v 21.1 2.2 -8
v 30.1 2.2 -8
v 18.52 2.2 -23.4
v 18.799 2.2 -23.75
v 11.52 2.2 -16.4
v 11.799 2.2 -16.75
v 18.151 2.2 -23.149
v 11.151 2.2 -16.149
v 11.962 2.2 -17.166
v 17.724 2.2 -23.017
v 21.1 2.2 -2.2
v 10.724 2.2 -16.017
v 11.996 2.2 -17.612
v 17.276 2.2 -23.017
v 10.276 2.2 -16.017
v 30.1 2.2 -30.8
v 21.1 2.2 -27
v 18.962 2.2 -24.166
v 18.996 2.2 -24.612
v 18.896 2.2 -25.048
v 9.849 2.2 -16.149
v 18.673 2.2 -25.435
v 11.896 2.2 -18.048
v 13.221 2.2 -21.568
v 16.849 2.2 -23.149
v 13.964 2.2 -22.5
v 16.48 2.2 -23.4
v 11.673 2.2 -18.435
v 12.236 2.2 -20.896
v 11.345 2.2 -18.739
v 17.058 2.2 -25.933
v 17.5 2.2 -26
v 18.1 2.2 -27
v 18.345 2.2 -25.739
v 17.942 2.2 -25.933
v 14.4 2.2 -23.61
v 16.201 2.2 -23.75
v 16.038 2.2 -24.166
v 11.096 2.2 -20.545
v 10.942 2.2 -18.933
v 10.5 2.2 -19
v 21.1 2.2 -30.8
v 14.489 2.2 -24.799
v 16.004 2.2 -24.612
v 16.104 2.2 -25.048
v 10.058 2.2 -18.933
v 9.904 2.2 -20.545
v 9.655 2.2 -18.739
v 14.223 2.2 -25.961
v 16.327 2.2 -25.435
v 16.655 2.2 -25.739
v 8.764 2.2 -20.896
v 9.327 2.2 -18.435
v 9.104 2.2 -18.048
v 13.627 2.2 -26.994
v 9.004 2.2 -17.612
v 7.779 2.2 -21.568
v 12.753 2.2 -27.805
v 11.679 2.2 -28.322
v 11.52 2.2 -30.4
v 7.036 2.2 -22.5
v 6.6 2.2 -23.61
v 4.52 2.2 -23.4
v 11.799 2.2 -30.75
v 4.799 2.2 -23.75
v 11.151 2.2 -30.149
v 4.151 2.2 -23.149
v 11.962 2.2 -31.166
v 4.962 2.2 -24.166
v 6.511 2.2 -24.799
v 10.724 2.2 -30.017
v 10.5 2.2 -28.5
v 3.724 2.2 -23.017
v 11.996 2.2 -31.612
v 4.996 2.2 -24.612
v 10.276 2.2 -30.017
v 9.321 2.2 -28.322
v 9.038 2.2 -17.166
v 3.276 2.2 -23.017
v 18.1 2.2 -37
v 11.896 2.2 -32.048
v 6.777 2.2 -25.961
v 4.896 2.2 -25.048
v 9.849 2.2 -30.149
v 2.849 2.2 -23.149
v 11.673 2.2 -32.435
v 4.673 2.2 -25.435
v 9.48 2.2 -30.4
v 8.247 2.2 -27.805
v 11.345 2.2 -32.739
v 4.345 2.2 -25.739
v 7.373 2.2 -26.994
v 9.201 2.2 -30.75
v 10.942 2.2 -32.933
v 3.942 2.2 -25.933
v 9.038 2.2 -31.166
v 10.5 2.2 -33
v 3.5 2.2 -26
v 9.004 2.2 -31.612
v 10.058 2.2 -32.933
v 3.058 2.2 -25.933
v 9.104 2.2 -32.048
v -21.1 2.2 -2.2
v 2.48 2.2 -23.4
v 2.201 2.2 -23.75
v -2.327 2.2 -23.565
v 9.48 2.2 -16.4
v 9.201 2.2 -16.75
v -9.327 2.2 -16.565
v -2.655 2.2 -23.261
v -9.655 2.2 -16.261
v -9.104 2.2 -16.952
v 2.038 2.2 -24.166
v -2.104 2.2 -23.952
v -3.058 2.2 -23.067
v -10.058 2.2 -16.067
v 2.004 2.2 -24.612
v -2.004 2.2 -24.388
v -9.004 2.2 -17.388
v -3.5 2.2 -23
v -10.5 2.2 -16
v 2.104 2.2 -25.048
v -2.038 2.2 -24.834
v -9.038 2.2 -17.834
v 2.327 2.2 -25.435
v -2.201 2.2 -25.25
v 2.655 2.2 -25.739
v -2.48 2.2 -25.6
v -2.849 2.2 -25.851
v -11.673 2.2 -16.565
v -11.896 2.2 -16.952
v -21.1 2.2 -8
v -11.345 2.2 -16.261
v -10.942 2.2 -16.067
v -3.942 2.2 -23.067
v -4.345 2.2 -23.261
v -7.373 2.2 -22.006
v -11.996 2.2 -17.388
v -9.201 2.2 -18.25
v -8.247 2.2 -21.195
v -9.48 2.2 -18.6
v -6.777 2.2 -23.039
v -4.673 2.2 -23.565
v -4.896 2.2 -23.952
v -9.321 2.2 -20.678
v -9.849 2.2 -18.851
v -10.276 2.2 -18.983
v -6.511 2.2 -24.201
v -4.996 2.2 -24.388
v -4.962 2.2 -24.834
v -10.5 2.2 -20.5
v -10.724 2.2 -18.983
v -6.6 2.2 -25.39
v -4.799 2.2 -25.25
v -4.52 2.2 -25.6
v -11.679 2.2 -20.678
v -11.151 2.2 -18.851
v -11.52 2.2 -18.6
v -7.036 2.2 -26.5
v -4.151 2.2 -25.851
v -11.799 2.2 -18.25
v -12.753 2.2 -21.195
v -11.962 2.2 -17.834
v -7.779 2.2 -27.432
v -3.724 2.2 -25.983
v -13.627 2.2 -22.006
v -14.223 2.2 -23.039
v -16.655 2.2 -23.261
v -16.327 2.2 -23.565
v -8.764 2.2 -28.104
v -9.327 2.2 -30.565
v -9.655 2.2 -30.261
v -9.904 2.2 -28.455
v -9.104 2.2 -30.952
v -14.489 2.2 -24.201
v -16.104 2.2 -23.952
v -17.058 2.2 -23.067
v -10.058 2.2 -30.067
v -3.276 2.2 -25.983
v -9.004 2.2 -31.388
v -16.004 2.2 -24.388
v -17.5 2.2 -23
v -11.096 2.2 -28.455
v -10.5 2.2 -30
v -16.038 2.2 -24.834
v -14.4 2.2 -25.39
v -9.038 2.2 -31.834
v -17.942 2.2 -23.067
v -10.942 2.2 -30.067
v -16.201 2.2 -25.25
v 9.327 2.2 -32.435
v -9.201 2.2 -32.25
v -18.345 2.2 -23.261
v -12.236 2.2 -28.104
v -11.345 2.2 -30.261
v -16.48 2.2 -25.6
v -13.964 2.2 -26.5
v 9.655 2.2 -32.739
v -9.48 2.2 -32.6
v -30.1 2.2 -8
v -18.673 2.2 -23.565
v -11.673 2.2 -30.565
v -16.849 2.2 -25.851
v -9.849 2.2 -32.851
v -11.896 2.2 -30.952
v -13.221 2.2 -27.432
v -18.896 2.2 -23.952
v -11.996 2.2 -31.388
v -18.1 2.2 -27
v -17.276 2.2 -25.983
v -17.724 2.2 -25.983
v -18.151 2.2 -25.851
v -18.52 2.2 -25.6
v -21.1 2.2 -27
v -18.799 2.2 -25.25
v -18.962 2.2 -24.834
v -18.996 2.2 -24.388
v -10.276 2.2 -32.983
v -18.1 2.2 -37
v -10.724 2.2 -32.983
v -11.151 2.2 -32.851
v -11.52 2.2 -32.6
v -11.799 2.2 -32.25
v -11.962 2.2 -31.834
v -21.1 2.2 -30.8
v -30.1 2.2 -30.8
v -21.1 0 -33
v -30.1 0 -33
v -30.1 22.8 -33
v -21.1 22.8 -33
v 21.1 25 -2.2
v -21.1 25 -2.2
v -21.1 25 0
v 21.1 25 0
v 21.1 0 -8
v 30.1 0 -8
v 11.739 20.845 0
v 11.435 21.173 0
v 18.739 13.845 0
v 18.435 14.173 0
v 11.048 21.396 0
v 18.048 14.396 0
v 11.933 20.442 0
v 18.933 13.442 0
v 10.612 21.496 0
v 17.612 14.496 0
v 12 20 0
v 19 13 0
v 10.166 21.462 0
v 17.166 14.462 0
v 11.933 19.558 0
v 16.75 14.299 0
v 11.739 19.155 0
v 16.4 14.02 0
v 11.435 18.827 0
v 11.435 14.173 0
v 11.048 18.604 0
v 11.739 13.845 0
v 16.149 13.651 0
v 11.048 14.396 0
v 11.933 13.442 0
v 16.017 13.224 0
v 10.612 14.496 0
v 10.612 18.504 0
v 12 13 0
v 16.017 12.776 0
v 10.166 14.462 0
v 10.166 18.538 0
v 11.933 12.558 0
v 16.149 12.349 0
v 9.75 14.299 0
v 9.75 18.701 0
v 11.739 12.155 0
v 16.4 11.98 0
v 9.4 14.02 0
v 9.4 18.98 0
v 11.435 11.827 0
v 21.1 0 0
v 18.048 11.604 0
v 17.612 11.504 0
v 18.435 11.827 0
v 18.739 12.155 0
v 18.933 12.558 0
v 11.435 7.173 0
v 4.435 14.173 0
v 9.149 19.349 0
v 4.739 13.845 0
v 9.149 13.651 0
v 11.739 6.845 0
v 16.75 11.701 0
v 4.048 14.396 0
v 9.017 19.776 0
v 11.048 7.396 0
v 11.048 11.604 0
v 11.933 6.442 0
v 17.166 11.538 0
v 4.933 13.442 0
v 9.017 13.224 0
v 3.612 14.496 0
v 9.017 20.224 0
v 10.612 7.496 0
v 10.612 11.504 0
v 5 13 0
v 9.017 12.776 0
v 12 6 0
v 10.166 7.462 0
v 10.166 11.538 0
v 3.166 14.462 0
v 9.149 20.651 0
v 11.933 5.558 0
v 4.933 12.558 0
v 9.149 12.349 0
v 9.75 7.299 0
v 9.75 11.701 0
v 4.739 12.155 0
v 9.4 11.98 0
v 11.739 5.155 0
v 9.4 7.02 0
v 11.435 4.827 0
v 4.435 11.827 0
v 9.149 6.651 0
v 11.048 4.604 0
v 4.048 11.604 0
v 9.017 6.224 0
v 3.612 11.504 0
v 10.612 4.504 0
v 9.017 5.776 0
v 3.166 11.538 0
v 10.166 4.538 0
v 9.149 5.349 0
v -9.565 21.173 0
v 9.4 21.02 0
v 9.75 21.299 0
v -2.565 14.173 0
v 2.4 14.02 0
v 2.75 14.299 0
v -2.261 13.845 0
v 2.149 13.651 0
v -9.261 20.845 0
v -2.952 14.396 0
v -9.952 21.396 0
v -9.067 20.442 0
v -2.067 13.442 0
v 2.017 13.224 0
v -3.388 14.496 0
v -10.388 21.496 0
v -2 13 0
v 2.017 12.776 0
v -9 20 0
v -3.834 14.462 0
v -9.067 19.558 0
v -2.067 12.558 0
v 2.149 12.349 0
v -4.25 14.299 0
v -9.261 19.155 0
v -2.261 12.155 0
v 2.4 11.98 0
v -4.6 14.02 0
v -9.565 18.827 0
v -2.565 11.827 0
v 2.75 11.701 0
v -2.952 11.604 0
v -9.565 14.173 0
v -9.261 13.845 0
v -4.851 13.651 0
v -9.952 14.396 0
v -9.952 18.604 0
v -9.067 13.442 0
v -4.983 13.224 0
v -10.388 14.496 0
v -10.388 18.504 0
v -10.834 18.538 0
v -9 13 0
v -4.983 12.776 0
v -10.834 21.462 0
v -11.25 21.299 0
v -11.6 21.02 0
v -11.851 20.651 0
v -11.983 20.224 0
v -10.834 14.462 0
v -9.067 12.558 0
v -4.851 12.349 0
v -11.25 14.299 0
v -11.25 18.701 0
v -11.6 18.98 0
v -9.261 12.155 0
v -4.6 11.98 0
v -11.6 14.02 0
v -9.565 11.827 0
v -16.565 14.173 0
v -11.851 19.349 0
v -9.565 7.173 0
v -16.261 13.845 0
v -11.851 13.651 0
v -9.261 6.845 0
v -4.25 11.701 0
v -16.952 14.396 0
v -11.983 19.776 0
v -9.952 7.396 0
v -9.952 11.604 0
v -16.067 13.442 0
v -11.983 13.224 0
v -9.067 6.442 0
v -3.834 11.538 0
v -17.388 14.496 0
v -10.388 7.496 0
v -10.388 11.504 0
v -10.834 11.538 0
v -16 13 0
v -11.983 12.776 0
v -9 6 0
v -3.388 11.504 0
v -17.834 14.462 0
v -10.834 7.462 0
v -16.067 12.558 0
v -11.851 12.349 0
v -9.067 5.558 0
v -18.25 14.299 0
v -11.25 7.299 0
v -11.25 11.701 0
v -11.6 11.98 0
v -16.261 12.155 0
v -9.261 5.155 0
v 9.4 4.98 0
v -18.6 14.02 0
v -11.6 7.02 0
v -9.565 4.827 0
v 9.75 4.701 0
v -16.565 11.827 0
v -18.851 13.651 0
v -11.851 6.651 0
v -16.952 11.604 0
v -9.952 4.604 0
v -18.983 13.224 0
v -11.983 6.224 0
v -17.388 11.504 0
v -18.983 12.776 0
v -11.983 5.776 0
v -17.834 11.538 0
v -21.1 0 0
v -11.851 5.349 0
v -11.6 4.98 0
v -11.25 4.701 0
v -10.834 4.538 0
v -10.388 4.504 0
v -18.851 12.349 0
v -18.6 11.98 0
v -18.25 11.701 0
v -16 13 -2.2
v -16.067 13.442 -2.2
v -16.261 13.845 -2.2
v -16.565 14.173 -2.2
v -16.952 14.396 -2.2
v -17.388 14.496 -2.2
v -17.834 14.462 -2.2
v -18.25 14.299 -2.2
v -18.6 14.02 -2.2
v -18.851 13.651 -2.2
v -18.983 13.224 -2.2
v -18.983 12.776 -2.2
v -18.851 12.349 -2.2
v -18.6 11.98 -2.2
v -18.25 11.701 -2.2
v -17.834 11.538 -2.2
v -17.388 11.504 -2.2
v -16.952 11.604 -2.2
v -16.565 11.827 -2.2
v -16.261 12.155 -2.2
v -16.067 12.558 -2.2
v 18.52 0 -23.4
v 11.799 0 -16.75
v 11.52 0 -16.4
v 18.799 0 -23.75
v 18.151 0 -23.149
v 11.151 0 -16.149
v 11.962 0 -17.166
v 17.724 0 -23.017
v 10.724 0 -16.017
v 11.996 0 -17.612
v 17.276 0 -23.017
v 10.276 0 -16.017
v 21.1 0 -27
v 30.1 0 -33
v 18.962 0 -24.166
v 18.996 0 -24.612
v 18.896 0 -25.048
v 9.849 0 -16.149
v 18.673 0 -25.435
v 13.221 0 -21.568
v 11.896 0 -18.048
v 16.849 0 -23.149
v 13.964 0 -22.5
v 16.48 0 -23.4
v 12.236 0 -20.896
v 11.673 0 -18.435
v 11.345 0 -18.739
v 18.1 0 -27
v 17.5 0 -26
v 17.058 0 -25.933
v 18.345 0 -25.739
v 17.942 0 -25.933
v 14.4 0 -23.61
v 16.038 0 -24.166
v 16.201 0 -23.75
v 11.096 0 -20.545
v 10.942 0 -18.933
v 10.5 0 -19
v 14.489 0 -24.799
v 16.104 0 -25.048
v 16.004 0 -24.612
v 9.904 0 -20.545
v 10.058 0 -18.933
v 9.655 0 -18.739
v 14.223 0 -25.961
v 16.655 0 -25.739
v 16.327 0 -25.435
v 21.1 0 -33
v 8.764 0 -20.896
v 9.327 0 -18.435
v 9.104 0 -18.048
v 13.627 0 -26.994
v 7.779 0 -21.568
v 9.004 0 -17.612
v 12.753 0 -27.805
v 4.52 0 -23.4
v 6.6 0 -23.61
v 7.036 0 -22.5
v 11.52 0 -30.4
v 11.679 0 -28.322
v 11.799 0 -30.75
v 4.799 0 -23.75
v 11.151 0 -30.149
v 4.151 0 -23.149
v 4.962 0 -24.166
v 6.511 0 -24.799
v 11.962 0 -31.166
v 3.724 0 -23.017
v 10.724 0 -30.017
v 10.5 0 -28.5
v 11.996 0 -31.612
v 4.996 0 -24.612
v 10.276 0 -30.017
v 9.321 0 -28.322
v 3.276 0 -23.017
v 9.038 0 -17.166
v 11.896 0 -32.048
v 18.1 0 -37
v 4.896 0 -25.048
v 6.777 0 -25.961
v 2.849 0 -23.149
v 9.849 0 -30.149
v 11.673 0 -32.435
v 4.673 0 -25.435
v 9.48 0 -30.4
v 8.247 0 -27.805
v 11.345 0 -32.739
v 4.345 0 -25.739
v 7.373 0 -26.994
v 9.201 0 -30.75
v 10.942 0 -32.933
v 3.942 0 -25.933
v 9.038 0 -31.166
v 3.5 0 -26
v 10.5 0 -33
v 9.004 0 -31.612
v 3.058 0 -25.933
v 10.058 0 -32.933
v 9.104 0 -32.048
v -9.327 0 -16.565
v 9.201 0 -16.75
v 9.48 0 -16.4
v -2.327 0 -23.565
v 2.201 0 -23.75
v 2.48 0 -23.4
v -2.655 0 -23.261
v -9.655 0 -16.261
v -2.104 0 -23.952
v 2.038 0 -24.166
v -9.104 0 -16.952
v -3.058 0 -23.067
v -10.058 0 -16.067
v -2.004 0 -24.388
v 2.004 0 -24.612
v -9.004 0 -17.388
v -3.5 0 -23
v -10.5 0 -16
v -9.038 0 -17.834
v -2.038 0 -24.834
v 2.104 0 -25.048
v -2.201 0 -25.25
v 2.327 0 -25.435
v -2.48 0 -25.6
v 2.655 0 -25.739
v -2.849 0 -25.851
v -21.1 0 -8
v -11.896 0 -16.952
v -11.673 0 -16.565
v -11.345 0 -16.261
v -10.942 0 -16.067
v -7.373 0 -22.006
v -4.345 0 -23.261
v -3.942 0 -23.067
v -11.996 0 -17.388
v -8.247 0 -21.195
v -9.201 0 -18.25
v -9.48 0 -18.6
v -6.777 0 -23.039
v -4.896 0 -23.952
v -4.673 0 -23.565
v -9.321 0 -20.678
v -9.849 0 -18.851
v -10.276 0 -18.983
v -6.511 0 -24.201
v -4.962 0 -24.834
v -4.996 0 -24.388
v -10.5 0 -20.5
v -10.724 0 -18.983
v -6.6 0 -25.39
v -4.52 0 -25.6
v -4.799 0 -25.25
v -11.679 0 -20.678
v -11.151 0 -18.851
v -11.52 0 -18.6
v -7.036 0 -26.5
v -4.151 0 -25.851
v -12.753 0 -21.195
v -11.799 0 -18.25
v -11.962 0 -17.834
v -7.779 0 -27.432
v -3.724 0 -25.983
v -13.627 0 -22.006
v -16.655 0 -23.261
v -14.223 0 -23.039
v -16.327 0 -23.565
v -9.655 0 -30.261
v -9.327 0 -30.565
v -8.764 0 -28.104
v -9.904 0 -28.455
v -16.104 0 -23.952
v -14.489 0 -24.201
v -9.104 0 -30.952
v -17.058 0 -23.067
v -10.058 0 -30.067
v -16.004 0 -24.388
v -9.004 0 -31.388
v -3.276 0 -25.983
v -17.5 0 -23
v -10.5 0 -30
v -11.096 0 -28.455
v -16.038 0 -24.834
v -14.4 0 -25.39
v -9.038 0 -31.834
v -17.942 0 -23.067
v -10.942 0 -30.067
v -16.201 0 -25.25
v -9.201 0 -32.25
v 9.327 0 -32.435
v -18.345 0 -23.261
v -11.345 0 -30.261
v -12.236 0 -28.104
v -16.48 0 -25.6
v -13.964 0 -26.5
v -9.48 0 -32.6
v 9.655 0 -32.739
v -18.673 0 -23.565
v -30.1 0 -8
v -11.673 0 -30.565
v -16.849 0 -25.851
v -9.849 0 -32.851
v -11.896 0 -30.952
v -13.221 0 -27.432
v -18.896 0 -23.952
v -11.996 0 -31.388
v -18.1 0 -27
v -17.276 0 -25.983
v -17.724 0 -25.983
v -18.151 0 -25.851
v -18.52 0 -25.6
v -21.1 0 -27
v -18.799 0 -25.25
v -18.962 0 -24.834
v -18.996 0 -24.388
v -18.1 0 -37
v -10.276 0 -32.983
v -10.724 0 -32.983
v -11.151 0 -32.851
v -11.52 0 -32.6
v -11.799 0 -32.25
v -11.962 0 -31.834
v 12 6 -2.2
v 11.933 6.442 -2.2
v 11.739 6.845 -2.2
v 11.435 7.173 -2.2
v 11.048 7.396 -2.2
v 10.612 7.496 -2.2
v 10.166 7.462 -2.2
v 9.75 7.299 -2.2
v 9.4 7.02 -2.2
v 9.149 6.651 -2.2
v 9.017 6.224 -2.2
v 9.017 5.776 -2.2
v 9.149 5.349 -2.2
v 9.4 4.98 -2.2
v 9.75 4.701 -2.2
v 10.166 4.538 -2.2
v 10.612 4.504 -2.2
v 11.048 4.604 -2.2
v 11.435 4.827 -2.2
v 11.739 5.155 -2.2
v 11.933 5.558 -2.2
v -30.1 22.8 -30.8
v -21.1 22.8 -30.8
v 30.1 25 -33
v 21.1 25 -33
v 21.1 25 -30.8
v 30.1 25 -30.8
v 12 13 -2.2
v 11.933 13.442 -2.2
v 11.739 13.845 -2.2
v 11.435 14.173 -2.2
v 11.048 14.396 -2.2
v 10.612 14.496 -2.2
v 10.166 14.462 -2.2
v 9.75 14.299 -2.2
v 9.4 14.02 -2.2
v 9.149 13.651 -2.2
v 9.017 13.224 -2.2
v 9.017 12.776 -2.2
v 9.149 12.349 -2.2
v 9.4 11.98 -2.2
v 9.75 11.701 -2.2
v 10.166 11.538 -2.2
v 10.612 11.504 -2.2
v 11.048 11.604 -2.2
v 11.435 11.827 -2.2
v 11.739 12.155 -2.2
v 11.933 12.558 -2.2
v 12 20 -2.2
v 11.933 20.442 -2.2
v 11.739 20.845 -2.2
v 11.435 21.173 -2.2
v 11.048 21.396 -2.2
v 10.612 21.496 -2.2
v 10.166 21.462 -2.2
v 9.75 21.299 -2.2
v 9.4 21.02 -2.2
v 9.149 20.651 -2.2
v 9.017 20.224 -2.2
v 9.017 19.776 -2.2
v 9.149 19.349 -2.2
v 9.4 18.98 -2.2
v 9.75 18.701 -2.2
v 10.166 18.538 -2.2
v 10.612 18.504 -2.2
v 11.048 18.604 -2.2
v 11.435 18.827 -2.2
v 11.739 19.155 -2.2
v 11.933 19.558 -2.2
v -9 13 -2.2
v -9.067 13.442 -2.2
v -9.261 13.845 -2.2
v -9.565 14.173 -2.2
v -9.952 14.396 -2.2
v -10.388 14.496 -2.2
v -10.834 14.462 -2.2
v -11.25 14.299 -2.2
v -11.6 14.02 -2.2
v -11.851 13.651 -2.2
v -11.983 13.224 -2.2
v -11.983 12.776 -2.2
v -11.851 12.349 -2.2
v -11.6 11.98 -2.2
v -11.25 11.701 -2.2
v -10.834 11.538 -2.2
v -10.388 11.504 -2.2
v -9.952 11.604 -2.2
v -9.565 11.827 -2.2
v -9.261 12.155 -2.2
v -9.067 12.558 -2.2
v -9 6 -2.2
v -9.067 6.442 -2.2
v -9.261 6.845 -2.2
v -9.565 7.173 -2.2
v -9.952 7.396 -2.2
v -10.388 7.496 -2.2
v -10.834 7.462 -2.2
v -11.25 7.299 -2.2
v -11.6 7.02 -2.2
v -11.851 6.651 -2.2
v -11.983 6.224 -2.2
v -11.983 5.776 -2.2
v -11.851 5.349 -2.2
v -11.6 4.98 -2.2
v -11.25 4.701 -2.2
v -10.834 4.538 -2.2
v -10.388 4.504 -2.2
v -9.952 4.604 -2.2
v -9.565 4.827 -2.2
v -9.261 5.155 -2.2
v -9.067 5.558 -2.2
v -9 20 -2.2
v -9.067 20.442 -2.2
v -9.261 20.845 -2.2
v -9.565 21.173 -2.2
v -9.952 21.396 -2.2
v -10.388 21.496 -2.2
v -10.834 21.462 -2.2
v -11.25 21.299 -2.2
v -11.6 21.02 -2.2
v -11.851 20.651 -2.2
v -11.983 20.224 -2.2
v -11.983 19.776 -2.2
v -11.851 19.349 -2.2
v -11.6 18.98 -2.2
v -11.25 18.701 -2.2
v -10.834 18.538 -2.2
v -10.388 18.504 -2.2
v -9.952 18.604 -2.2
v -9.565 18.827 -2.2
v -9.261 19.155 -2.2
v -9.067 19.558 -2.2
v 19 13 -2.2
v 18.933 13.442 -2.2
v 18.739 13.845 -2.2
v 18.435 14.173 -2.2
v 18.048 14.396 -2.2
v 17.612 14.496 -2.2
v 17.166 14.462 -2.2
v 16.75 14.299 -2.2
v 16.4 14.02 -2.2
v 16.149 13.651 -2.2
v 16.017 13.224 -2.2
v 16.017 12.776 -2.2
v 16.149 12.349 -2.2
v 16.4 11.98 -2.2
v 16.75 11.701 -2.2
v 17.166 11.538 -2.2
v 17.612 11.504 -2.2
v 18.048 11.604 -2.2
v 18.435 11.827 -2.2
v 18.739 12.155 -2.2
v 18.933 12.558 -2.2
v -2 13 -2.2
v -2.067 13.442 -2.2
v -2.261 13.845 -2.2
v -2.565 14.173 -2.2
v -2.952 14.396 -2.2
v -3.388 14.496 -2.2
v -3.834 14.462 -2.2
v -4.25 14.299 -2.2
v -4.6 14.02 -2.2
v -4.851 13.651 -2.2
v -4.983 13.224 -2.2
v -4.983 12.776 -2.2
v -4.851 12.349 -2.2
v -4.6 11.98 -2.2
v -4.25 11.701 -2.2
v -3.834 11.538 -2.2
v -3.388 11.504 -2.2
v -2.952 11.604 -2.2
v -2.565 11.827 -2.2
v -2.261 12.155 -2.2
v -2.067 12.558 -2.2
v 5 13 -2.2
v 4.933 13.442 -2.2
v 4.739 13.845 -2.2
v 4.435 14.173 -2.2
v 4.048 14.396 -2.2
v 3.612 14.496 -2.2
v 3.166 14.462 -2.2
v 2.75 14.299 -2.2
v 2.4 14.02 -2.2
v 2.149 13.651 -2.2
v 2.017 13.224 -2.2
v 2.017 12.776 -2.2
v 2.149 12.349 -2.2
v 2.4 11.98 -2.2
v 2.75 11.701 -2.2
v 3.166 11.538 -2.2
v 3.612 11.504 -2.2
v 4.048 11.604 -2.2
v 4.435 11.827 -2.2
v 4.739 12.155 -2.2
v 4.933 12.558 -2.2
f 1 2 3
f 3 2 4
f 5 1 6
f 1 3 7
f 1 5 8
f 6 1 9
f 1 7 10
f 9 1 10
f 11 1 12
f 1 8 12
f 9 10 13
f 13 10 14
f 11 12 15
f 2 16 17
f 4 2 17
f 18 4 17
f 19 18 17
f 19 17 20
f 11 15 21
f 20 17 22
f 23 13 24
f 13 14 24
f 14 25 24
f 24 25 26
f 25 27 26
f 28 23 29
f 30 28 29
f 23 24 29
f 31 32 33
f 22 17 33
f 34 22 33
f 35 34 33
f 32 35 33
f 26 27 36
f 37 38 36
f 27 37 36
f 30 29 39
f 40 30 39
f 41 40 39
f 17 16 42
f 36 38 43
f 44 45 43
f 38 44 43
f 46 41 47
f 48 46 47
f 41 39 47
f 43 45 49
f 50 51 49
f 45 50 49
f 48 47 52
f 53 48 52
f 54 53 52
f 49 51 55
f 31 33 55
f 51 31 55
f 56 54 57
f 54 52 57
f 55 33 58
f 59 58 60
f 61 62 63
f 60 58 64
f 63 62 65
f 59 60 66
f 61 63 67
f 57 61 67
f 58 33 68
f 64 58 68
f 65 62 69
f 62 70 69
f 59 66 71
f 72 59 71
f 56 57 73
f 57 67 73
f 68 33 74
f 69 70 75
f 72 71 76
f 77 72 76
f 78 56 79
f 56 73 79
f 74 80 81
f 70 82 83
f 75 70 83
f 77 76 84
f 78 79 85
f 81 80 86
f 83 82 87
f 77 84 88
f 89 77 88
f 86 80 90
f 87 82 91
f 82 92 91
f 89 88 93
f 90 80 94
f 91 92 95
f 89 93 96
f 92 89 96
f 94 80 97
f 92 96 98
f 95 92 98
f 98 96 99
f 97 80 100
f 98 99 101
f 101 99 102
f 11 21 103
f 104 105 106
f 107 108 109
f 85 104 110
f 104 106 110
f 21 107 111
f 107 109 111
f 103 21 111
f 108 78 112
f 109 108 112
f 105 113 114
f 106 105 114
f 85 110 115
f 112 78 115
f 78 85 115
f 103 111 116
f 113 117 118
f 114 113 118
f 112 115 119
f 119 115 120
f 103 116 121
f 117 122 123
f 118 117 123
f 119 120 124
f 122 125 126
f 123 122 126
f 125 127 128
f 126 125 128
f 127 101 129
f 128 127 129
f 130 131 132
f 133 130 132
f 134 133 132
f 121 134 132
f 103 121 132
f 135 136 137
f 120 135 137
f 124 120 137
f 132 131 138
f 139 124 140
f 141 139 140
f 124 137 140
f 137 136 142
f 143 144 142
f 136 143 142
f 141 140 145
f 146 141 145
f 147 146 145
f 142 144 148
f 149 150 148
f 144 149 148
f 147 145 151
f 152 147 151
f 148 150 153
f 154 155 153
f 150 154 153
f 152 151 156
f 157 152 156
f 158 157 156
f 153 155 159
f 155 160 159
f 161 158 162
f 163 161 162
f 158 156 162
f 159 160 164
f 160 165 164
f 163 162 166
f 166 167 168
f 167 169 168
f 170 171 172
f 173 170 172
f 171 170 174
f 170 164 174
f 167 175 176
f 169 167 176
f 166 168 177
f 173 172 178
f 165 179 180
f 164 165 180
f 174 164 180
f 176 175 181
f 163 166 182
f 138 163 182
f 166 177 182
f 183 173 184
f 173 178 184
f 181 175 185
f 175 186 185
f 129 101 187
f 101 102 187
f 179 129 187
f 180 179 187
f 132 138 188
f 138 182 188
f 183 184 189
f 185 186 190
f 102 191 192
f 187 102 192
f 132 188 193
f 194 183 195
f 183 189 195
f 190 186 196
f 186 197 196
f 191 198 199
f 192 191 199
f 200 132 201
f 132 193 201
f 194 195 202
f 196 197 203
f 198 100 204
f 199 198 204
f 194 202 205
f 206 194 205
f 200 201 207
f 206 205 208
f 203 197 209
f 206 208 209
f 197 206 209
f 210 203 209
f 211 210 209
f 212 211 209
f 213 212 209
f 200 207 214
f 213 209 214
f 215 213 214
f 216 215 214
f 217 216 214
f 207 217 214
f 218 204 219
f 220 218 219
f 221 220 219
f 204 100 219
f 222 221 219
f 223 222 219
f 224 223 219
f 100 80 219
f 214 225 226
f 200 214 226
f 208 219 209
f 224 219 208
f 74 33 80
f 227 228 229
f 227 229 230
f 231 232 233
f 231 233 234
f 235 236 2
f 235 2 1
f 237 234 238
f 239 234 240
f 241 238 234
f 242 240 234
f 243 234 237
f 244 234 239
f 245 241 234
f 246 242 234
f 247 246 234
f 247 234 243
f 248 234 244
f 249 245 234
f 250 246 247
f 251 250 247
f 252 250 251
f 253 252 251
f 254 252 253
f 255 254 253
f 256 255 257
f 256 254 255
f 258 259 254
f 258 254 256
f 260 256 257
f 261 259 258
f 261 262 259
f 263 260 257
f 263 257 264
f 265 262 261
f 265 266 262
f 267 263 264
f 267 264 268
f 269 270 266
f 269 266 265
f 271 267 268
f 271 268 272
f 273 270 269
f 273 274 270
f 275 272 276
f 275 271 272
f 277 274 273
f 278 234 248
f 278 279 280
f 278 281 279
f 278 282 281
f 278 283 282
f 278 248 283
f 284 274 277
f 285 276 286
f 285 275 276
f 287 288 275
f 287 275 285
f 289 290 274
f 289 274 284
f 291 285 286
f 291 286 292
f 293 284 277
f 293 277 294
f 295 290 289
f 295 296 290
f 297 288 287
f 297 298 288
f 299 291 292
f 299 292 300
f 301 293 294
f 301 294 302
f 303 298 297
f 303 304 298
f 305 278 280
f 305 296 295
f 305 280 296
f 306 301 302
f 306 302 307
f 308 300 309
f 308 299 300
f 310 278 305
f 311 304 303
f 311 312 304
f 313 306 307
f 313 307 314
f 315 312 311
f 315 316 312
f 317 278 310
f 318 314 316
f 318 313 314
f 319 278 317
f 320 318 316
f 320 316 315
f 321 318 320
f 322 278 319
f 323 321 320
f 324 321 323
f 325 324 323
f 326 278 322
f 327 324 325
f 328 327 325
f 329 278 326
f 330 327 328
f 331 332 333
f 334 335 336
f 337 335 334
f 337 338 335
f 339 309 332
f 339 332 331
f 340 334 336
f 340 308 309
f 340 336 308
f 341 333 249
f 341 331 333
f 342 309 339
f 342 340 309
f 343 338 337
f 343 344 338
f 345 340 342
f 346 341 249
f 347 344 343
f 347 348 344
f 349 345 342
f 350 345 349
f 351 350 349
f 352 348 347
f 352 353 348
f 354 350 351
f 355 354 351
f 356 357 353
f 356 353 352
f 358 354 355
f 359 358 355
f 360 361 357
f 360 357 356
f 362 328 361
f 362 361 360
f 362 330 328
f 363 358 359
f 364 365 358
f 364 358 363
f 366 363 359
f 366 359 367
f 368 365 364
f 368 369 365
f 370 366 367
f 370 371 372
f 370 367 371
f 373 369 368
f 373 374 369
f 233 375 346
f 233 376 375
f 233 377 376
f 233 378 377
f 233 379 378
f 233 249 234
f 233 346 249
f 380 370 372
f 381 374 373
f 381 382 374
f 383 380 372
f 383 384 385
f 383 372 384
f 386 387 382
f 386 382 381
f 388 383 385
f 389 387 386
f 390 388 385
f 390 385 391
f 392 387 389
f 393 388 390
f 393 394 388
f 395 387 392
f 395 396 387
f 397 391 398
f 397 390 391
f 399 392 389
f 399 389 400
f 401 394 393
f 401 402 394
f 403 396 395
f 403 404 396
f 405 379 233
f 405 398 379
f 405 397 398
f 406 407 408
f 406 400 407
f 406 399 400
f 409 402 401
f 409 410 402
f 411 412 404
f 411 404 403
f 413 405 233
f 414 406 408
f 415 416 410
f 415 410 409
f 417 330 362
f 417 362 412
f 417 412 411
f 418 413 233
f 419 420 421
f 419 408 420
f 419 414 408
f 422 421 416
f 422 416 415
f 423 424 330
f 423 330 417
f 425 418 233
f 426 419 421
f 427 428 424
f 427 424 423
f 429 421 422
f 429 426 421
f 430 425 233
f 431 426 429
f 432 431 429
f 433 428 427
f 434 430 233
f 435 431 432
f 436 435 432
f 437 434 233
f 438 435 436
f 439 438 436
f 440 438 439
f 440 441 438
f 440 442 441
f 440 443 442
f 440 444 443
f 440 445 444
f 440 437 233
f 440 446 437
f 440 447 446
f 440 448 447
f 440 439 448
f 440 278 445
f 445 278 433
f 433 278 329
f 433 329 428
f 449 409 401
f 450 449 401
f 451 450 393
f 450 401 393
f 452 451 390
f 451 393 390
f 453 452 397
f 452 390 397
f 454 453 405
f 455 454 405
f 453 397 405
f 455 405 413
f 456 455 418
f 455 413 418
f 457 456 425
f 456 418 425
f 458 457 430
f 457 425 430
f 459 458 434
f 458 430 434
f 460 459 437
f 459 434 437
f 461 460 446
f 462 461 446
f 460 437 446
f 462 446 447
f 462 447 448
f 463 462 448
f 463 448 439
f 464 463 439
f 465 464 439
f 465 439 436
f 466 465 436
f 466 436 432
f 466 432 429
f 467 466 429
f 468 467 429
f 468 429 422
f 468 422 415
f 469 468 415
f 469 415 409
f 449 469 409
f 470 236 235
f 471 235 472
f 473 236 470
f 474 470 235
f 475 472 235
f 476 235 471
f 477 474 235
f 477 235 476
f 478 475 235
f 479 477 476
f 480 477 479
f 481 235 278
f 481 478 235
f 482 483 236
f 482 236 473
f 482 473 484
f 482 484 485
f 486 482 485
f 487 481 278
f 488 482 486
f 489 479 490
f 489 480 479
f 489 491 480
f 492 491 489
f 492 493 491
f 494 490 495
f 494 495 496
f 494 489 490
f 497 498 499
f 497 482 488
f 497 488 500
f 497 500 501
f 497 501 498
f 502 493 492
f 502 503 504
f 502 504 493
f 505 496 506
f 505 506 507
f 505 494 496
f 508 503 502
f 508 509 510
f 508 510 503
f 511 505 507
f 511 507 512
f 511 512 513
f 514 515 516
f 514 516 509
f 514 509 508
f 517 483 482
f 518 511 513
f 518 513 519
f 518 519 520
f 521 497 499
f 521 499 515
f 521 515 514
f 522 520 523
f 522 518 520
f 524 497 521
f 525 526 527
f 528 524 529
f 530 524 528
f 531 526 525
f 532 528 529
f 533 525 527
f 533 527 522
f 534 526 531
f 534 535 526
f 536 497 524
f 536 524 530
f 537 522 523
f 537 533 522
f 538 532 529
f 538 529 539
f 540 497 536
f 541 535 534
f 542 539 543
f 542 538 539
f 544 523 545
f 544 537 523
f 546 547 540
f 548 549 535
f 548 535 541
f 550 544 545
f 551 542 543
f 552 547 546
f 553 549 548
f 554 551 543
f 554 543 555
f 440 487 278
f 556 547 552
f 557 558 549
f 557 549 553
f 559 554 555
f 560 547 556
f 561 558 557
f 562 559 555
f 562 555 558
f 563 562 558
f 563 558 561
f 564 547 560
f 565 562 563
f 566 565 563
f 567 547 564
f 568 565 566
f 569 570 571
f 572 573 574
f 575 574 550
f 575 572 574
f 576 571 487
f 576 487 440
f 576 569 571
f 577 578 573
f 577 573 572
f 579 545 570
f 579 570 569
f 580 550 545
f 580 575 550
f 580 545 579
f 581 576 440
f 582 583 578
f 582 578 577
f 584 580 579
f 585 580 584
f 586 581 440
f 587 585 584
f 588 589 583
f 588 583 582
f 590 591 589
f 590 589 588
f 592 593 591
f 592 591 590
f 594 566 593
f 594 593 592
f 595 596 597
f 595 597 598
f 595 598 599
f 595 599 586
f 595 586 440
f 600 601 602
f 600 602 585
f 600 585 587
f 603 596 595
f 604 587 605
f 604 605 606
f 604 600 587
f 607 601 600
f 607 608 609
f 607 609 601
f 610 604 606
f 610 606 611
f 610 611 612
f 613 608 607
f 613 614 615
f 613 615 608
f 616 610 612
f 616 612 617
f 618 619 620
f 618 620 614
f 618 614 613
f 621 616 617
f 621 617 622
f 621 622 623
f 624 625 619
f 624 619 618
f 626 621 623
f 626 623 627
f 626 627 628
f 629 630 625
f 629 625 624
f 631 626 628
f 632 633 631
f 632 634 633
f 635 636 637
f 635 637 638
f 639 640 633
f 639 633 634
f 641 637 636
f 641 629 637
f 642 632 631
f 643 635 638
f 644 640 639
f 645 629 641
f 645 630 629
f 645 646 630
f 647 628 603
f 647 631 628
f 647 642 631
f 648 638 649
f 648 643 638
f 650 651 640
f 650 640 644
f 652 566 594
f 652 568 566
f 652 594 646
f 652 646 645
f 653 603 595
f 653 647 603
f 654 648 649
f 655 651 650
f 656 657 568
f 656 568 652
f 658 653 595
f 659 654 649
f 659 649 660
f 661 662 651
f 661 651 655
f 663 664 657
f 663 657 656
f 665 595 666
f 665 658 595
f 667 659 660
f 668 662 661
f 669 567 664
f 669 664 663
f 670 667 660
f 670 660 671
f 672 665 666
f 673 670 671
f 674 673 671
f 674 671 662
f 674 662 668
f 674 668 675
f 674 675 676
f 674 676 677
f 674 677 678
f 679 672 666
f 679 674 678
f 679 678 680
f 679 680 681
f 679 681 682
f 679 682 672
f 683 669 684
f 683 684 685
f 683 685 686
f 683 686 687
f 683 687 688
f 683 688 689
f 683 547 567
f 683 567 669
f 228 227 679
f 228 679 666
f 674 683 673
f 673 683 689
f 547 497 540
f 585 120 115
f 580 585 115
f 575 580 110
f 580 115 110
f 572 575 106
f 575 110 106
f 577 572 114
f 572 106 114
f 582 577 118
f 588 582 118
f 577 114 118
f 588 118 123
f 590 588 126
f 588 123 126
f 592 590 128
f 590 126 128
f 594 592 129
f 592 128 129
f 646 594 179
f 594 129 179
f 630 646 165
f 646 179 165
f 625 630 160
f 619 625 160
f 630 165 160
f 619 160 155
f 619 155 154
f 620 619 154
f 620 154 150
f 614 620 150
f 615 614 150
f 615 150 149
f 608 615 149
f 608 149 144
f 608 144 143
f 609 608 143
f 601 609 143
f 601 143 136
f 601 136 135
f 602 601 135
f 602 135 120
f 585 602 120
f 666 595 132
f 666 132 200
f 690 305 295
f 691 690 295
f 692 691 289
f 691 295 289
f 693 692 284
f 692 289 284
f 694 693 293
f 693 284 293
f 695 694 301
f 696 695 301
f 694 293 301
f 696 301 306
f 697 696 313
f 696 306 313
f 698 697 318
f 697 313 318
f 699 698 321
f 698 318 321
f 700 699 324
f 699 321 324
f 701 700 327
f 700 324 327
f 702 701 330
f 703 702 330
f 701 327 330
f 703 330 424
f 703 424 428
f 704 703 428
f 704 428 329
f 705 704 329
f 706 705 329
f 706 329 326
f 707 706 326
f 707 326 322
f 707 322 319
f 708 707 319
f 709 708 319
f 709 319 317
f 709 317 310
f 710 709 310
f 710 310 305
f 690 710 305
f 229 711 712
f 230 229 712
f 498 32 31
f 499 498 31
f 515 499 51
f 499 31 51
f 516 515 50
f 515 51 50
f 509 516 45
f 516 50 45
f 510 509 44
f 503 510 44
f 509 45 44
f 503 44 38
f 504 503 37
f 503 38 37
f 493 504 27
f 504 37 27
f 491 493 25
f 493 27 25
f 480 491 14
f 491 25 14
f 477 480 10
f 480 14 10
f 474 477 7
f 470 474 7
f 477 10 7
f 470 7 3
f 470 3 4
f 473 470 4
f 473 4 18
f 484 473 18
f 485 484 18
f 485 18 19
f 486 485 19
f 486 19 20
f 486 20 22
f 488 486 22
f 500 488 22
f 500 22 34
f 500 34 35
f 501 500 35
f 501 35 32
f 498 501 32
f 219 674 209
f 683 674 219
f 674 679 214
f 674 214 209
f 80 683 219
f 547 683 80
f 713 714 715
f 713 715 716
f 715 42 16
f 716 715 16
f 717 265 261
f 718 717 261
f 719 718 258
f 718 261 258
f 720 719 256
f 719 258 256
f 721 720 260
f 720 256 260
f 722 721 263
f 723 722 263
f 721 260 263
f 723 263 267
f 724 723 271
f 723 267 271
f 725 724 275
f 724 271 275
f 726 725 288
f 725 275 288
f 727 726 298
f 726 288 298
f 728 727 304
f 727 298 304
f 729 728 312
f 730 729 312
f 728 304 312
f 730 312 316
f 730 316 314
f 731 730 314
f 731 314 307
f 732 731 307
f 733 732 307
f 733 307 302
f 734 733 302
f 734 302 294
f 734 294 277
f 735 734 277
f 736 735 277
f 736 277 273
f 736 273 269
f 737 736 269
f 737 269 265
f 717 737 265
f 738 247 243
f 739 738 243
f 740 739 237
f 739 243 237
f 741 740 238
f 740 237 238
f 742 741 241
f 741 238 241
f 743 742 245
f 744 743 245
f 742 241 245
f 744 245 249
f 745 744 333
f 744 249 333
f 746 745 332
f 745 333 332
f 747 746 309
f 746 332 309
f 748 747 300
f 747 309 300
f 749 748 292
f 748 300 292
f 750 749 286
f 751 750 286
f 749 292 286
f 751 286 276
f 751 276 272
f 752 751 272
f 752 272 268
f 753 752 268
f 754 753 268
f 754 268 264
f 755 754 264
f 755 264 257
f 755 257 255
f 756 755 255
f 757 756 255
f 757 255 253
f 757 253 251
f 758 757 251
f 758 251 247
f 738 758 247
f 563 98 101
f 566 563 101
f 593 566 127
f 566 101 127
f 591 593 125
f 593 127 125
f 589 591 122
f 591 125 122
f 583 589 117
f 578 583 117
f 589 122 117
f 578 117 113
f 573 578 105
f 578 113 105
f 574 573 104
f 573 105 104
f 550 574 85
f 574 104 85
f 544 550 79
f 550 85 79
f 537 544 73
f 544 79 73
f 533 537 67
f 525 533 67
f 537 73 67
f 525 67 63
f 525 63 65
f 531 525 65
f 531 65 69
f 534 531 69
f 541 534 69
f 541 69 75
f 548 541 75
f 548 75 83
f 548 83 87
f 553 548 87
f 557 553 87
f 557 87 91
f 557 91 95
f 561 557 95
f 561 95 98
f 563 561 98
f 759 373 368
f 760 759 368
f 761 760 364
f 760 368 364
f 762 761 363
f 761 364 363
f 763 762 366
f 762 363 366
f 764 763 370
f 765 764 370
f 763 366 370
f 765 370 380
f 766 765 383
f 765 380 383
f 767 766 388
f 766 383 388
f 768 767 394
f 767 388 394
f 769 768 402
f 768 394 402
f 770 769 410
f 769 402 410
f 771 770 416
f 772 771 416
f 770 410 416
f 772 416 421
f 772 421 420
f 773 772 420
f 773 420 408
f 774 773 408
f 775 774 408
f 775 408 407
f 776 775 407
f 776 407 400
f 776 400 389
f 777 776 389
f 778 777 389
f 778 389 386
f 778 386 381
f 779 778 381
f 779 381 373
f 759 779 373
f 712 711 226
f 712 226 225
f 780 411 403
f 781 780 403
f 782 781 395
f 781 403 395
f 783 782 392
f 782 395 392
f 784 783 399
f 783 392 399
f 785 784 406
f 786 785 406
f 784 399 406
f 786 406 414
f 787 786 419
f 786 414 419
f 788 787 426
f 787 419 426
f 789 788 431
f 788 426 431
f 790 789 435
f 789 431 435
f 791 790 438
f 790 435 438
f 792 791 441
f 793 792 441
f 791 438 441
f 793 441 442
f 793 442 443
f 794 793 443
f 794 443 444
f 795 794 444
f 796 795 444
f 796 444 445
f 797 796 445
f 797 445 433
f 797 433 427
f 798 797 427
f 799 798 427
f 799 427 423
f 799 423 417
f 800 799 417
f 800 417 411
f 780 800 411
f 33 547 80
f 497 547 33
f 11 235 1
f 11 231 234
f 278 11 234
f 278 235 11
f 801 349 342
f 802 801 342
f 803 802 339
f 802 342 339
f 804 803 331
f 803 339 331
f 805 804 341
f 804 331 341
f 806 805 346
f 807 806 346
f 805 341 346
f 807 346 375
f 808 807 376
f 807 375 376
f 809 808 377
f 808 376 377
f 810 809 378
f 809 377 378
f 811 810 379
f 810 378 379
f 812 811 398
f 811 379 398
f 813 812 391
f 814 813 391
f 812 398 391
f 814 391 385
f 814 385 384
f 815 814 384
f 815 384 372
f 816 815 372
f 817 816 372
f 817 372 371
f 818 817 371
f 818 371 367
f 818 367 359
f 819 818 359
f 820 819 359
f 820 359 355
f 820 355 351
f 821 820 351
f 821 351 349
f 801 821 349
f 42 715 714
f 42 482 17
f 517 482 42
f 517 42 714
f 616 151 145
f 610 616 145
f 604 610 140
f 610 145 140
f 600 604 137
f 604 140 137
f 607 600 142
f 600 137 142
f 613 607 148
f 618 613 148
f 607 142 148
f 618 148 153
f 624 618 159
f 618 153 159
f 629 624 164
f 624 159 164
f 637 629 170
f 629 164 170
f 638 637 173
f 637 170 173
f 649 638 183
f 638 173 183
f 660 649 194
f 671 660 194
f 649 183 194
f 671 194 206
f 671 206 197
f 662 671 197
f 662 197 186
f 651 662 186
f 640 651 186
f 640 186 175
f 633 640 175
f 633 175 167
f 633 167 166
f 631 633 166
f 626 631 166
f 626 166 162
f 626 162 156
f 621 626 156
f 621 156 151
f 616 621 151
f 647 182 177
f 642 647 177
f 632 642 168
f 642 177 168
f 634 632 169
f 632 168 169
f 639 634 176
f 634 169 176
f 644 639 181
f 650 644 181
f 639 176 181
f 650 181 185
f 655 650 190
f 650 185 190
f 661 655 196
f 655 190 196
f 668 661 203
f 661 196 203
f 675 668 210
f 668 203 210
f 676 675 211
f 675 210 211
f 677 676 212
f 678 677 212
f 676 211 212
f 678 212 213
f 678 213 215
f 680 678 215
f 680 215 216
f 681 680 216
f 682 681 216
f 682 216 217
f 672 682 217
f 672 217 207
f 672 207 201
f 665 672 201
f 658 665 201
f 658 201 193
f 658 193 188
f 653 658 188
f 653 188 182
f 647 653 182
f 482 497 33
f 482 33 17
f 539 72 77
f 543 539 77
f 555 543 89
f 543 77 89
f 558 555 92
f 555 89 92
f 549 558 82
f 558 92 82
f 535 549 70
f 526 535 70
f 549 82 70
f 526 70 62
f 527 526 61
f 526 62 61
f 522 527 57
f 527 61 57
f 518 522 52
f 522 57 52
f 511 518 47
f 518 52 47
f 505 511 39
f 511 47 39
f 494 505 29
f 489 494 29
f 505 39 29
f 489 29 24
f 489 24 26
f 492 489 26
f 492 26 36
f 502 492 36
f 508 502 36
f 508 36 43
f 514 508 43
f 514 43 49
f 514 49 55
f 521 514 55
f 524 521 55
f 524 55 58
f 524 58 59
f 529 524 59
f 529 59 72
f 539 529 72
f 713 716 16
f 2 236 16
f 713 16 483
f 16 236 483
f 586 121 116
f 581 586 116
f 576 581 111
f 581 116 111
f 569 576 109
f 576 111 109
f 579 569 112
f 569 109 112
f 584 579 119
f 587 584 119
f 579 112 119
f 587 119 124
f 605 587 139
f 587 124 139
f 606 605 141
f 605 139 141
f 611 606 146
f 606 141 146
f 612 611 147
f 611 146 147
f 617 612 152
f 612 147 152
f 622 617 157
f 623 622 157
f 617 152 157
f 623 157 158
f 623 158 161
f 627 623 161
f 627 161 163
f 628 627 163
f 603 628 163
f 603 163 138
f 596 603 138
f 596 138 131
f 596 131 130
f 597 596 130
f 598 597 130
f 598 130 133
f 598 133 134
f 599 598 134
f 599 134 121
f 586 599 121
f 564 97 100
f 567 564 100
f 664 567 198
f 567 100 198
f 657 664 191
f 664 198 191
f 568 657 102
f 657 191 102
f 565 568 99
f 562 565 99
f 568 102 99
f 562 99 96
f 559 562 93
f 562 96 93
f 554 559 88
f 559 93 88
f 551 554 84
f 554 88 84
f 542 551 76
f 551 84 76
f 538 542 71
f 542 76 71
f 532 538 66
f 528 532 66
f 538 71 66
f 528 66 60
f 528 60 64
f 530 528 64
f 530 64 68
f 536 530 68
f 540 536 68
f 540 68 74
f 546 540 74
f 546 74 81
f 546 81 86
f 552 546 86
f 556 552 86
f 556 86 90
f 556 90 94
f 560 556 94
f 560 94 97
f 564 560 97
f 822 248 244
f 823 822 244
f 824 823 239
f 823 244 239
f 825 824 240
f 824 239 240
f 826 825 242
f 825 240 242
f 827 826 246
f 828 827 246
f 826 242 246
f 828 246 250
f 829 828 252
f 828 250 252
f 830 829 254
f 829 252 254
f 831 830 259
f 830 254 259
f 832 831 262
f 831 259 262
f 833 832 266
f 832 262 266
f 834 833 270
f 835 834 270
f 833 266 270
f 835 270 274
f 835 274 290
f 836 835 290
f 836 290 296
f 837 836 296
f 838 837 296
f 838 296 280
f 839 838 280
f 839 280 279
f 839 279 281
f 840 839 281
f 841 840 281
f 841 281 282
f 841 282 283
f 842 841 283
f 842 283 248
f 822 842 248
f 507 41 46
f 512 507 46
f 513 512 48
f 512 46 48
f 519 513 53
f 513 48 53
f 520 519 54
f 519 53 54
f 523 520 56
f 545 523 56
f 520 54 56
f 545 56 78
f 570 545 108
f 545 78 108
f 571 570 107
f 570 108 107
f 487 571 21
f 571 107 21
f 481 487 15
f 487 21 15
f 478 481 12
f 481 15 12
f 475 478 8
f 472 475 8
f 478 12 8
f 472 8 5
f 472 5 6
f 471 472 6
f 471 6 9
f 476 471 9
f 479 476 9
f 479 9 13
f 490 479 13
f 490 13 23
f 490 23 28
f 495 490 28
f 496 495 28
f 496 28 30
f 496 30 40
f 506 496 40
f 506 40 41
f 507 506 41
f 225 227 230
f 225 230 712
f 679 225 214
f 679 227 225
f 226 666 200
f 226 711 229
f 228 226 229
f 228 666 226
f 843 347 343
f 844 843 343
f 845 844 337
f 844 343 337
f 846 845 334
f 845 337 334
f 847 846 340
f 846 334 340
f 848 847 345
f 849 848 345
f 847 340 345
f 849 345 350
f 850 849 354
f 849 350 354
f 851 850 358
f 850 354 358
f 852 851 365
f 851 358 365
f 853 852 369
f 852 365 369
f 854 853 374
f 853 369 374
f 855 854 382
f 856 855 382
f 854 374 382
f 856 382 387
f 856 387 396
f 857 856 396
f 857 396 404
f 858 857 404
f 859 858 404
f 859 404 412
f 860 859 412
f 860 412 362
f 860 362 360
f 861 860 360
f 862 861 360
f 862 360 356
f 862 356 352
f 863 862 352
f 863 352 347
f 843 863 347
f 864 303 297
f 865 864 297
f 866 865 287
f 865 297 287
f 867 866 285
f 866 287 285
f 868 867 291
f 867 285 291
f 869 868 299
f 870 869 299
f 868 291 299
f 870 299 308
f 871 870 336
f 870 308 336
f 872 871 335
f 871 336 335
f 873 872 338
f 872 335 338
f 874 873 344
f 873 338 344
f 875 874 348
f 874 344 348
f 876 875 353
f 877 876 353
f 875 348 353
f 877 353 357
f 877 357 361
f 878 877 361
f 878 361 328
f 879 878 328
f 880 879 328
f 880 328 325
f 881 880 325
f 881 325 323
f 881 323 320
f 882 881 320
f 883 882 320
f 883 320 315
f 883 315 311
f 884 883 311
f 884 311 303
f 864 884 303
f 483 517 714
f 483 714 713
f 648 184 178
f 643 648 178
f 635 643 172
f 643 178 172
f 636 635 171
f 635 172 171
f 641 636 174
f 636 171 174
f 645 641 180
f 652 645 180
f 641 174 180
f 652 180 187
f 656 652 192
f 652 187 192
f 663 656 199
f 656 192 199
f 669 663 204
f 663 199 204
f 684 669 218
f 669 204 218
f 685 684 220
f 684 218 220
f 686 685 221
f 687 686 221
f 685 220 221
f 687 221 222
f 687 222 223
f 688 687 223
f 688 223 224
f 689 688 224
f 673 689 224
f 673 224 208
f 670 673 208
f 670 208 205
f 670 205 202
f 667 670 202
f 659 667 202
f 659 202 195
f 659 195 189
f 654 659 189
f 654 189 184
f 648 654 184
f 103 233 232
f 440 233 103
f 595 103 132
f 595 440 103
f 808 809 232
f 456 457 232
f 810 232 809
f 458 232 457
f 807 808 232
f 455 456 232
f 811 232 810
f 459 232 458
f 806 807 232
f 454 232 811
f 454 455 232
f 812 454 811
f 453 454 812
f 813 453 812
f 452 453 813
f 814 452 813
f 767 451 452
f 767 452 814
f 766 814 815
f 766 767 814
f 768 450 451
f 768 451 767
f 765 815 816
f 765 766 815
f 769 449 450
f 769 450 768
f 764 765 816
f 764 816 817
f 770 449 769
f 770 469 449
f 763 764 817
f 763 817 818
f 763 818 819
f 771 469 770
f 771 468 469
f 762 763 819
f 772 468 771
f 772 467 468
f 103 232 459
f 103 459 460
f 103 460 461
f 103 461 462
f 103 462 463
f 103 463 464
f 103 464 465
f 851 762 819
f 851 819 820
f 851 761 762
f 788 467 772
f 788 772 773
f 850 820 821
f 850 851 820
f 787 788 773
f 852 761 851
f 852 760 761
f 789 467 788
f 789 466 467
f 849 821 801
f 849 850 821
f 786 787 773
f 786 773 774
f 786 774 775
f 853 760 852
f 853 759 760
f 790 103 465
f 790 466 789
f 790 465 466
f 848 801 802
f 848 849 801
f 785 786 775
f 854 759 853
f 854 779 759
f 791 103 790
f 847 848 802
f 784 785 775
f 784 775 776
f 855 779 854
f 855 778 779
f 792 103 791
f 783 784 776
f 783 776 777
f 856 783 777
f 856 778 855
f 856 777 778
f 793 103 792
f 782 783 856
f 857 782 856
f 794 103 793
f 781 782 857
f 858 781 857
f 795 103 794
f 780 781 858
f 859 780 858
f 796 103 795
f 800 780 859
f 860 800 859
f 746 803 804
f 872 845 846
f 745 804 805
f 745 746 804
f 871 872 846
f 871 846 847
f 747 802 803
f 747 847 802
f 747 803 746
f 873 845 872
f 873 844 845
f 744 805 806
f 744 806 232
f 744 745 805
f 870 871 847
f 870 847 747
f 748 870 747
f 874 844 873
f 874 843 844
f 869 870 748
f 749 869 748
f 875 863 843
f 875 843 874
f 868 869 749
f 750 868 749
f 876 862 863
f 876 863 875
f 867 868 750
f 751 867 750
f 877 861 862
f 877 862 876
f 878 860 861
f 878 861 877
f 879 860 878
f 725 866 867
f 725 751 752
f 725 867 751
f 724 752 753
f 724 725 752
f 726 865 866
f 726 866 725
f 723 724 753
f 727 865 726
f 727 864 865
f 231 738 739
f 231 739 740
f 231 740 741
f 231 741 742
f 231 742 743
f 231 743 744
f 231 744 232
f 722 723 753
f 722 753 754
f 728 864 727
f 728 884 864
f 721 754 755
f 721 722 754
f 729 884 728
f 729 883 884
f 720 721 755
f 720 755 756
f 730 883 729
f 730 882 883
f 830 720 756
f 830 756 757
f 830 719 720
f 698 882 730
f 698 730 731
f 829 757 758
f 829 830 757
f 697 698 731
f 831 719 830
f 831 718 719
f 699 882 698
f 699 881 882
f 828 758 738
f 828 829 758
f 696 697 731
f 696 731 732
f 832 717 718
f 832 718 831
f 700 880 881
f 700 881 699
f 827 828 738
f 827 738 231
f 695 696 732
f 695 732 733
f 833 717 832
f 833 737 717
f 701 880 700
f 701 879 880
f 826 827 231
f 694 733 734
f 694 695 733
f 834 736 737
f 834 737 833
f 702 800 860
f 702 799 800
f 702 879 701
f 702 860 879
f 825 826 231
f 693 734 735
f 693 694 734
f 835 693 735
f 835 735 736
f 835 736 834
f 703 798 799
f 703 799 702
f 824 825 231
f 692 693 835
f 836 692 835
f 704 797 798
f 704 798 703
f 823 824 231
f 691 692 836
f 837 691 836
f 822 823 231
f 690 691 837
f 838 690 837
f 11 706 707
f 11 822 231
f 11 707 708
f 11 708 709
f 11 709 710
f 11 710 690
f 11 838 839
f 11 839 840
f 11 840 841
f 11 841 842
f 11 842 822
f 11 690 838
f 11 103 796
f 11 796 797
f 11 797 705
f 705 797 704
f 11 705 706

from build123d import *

# Parameters (mm, degrees)
BOSS_EXTRUDE1_DEPTH = 2.2
SKETCH2_W           = 9
SKETCH2_H           = 2.2
SKETCH2_W_2         = 42.2
BOSS_EXTRUDE2_DEPTH = 22.8
SKETCH3_W           = 9
SKETCH3_H           = 2.2
CUT_EXTRUDE1_DEPTH  = 50.796084183
SKETCH4_R           = 1.5
CUT_EXTRUDE2_DEPTH  = 54.851740919
SKETCH5_R           = 4
SKETCH5_R_2         = 1.5
CUT_EXTRUDE3_DEPTH  = 53.866340899


with BuildPart() as part:
    # Sketch1 → Boss-Extrude1 (new body)
    with BuildSketch(Plane(origin=(0, 0, 0), x_dir=(1, 0, 0), z_dir=(0, 1, 0))):
        Polygon((21.1, 0), (-21.1, 0), (-21.1, 8), (-30.1, 8), (-30.1, 33), (-21.1, 33), (-21.1, 27), (-18.1, 27), (-18.1, 37), (18.1, 37), (18.1, 27), (21.1, 27), (21.1, 33), (30.1, 33), (30.1, 8), (21.1, 8), align=None)
    extrude(amount=BOSS_EXTRUDE1_DEPTH)

    # Sketch2 → Boss-Extrude2 (add)
    with BuildSketch(Plane(origin=(0, 2.2, 0), x_dir=(1, 0, 0), z_dir=(0, 1, 0))):
        with Locations((25.6, 31.9)):
            Rectangle(SKETCH2_W, SKETCH2_H)
        with Locations((-25.6, 31.9)):
            Rectangle(SKETCH2_W, SKETCH2_H)
        with Locations((0, 1.1)):
            Rectangle(SKETCH2_W_2, SKETCH2_H)
    extrude(amount=BOSS_EXTRUDE2_DEPTH)

    # Sketch3 → Cut-Extrude1 (cut, through all)
    with BuildSketch(Plane.XY.offset(-30.8)):
        with Locations((-25.6, 23.9)):
            Rectangle(SKETCH3_W, SKETCH3_H)
    extrude(amount=-CUT_EXTRUDE1_DEPTH, mode=Mode.SUBTRACT)

    # Sketch4 → Cut-Extrude2 (cut, through all)
    with BuildSketch(Plane.XY):
        with Locations((-17.5, 13)):
            Circle(SKETCH4_R)
        with Locations((-10.5, 13)):
            Circle(SKETCH4_R)
        with Locations((-10.5, 20)):
            Circle(SKETCH4_R)
        with Locations((-3.5, 13)):
            Circle(SKETCH4_R)
        with Locations((-10.5, 6)):
            Circle(SKETCH4_R)
        with Locations((10.5, 6)):
            Circle(SKETCH4_R)
        with Locations((3.5, 13)):
            Circle(SKETCH4_R)
        with Locations((10.5, 20)):
            Circle(SKETCH4_R)
        with Locations((10.5, 13)):
            Circle(SKETCH4_R)
        with Locations((17.5, 13)):
            Circle(SKETCH4_R)
    extrude(amount=-CUT_EXTRUDE2_DEPTH, mode=Mode.SUBTRACT)

    # Sketch5 → Cut-Extrude3 (cut, through all)
    with BuildSketch(Plane(origin=(0, 2.2, 0), x_dir=(1, 0, 0), z_dir=(0, 1, 0))):
        with Locations(Location((-10.5, 24.5, 0), (0, 0, 270))):
            Circle(SKETCH5_R)
        with Locations(Location((-17.5, 24.5, 0), (0, 0, 270))):
            Circle(SKETCH5_R_2)
        with Locations(Location((-10.5, 31.5, 0), (0, 0, 270))):
            Circle(SKETCH5_R_2)
        with Locations(Location((-3.5, 24.5, 0), (0, 0, 270))):
            Circle(SKETCH5_R_2)
        with Locations(Location((-10.5, 17.5, 0), (0, 0, 270))):
            Circle(SKETCH5_R_2)
        with Locations(Location((10.5, 17.5, 0), (0, 0, 90))):
            Circle(SKETCH5_R_2)
        with Locations(Location((3.5, 24.5, 0), (0, 0, 90))):
            Circle(SKETCH5_R_2)
        with Locations(Location((10.5, 31.5, 0), (0, 0, 90))):
            Circle(SKETCH5_R_2)
        with Locations(Location((17.5, 24.5, 0), (0, 0, 90))):
            Circle(SKETCH5_R_2)
        with Locations(Location((10.5, 24.5, 0), (0, 0, 90))):
            Circle(SKETCH5_R)
    extrude(amount=-CUT_EXTRUDE3_DEPTH, mode=Mode.SUBTRACT)


solid = part.part
